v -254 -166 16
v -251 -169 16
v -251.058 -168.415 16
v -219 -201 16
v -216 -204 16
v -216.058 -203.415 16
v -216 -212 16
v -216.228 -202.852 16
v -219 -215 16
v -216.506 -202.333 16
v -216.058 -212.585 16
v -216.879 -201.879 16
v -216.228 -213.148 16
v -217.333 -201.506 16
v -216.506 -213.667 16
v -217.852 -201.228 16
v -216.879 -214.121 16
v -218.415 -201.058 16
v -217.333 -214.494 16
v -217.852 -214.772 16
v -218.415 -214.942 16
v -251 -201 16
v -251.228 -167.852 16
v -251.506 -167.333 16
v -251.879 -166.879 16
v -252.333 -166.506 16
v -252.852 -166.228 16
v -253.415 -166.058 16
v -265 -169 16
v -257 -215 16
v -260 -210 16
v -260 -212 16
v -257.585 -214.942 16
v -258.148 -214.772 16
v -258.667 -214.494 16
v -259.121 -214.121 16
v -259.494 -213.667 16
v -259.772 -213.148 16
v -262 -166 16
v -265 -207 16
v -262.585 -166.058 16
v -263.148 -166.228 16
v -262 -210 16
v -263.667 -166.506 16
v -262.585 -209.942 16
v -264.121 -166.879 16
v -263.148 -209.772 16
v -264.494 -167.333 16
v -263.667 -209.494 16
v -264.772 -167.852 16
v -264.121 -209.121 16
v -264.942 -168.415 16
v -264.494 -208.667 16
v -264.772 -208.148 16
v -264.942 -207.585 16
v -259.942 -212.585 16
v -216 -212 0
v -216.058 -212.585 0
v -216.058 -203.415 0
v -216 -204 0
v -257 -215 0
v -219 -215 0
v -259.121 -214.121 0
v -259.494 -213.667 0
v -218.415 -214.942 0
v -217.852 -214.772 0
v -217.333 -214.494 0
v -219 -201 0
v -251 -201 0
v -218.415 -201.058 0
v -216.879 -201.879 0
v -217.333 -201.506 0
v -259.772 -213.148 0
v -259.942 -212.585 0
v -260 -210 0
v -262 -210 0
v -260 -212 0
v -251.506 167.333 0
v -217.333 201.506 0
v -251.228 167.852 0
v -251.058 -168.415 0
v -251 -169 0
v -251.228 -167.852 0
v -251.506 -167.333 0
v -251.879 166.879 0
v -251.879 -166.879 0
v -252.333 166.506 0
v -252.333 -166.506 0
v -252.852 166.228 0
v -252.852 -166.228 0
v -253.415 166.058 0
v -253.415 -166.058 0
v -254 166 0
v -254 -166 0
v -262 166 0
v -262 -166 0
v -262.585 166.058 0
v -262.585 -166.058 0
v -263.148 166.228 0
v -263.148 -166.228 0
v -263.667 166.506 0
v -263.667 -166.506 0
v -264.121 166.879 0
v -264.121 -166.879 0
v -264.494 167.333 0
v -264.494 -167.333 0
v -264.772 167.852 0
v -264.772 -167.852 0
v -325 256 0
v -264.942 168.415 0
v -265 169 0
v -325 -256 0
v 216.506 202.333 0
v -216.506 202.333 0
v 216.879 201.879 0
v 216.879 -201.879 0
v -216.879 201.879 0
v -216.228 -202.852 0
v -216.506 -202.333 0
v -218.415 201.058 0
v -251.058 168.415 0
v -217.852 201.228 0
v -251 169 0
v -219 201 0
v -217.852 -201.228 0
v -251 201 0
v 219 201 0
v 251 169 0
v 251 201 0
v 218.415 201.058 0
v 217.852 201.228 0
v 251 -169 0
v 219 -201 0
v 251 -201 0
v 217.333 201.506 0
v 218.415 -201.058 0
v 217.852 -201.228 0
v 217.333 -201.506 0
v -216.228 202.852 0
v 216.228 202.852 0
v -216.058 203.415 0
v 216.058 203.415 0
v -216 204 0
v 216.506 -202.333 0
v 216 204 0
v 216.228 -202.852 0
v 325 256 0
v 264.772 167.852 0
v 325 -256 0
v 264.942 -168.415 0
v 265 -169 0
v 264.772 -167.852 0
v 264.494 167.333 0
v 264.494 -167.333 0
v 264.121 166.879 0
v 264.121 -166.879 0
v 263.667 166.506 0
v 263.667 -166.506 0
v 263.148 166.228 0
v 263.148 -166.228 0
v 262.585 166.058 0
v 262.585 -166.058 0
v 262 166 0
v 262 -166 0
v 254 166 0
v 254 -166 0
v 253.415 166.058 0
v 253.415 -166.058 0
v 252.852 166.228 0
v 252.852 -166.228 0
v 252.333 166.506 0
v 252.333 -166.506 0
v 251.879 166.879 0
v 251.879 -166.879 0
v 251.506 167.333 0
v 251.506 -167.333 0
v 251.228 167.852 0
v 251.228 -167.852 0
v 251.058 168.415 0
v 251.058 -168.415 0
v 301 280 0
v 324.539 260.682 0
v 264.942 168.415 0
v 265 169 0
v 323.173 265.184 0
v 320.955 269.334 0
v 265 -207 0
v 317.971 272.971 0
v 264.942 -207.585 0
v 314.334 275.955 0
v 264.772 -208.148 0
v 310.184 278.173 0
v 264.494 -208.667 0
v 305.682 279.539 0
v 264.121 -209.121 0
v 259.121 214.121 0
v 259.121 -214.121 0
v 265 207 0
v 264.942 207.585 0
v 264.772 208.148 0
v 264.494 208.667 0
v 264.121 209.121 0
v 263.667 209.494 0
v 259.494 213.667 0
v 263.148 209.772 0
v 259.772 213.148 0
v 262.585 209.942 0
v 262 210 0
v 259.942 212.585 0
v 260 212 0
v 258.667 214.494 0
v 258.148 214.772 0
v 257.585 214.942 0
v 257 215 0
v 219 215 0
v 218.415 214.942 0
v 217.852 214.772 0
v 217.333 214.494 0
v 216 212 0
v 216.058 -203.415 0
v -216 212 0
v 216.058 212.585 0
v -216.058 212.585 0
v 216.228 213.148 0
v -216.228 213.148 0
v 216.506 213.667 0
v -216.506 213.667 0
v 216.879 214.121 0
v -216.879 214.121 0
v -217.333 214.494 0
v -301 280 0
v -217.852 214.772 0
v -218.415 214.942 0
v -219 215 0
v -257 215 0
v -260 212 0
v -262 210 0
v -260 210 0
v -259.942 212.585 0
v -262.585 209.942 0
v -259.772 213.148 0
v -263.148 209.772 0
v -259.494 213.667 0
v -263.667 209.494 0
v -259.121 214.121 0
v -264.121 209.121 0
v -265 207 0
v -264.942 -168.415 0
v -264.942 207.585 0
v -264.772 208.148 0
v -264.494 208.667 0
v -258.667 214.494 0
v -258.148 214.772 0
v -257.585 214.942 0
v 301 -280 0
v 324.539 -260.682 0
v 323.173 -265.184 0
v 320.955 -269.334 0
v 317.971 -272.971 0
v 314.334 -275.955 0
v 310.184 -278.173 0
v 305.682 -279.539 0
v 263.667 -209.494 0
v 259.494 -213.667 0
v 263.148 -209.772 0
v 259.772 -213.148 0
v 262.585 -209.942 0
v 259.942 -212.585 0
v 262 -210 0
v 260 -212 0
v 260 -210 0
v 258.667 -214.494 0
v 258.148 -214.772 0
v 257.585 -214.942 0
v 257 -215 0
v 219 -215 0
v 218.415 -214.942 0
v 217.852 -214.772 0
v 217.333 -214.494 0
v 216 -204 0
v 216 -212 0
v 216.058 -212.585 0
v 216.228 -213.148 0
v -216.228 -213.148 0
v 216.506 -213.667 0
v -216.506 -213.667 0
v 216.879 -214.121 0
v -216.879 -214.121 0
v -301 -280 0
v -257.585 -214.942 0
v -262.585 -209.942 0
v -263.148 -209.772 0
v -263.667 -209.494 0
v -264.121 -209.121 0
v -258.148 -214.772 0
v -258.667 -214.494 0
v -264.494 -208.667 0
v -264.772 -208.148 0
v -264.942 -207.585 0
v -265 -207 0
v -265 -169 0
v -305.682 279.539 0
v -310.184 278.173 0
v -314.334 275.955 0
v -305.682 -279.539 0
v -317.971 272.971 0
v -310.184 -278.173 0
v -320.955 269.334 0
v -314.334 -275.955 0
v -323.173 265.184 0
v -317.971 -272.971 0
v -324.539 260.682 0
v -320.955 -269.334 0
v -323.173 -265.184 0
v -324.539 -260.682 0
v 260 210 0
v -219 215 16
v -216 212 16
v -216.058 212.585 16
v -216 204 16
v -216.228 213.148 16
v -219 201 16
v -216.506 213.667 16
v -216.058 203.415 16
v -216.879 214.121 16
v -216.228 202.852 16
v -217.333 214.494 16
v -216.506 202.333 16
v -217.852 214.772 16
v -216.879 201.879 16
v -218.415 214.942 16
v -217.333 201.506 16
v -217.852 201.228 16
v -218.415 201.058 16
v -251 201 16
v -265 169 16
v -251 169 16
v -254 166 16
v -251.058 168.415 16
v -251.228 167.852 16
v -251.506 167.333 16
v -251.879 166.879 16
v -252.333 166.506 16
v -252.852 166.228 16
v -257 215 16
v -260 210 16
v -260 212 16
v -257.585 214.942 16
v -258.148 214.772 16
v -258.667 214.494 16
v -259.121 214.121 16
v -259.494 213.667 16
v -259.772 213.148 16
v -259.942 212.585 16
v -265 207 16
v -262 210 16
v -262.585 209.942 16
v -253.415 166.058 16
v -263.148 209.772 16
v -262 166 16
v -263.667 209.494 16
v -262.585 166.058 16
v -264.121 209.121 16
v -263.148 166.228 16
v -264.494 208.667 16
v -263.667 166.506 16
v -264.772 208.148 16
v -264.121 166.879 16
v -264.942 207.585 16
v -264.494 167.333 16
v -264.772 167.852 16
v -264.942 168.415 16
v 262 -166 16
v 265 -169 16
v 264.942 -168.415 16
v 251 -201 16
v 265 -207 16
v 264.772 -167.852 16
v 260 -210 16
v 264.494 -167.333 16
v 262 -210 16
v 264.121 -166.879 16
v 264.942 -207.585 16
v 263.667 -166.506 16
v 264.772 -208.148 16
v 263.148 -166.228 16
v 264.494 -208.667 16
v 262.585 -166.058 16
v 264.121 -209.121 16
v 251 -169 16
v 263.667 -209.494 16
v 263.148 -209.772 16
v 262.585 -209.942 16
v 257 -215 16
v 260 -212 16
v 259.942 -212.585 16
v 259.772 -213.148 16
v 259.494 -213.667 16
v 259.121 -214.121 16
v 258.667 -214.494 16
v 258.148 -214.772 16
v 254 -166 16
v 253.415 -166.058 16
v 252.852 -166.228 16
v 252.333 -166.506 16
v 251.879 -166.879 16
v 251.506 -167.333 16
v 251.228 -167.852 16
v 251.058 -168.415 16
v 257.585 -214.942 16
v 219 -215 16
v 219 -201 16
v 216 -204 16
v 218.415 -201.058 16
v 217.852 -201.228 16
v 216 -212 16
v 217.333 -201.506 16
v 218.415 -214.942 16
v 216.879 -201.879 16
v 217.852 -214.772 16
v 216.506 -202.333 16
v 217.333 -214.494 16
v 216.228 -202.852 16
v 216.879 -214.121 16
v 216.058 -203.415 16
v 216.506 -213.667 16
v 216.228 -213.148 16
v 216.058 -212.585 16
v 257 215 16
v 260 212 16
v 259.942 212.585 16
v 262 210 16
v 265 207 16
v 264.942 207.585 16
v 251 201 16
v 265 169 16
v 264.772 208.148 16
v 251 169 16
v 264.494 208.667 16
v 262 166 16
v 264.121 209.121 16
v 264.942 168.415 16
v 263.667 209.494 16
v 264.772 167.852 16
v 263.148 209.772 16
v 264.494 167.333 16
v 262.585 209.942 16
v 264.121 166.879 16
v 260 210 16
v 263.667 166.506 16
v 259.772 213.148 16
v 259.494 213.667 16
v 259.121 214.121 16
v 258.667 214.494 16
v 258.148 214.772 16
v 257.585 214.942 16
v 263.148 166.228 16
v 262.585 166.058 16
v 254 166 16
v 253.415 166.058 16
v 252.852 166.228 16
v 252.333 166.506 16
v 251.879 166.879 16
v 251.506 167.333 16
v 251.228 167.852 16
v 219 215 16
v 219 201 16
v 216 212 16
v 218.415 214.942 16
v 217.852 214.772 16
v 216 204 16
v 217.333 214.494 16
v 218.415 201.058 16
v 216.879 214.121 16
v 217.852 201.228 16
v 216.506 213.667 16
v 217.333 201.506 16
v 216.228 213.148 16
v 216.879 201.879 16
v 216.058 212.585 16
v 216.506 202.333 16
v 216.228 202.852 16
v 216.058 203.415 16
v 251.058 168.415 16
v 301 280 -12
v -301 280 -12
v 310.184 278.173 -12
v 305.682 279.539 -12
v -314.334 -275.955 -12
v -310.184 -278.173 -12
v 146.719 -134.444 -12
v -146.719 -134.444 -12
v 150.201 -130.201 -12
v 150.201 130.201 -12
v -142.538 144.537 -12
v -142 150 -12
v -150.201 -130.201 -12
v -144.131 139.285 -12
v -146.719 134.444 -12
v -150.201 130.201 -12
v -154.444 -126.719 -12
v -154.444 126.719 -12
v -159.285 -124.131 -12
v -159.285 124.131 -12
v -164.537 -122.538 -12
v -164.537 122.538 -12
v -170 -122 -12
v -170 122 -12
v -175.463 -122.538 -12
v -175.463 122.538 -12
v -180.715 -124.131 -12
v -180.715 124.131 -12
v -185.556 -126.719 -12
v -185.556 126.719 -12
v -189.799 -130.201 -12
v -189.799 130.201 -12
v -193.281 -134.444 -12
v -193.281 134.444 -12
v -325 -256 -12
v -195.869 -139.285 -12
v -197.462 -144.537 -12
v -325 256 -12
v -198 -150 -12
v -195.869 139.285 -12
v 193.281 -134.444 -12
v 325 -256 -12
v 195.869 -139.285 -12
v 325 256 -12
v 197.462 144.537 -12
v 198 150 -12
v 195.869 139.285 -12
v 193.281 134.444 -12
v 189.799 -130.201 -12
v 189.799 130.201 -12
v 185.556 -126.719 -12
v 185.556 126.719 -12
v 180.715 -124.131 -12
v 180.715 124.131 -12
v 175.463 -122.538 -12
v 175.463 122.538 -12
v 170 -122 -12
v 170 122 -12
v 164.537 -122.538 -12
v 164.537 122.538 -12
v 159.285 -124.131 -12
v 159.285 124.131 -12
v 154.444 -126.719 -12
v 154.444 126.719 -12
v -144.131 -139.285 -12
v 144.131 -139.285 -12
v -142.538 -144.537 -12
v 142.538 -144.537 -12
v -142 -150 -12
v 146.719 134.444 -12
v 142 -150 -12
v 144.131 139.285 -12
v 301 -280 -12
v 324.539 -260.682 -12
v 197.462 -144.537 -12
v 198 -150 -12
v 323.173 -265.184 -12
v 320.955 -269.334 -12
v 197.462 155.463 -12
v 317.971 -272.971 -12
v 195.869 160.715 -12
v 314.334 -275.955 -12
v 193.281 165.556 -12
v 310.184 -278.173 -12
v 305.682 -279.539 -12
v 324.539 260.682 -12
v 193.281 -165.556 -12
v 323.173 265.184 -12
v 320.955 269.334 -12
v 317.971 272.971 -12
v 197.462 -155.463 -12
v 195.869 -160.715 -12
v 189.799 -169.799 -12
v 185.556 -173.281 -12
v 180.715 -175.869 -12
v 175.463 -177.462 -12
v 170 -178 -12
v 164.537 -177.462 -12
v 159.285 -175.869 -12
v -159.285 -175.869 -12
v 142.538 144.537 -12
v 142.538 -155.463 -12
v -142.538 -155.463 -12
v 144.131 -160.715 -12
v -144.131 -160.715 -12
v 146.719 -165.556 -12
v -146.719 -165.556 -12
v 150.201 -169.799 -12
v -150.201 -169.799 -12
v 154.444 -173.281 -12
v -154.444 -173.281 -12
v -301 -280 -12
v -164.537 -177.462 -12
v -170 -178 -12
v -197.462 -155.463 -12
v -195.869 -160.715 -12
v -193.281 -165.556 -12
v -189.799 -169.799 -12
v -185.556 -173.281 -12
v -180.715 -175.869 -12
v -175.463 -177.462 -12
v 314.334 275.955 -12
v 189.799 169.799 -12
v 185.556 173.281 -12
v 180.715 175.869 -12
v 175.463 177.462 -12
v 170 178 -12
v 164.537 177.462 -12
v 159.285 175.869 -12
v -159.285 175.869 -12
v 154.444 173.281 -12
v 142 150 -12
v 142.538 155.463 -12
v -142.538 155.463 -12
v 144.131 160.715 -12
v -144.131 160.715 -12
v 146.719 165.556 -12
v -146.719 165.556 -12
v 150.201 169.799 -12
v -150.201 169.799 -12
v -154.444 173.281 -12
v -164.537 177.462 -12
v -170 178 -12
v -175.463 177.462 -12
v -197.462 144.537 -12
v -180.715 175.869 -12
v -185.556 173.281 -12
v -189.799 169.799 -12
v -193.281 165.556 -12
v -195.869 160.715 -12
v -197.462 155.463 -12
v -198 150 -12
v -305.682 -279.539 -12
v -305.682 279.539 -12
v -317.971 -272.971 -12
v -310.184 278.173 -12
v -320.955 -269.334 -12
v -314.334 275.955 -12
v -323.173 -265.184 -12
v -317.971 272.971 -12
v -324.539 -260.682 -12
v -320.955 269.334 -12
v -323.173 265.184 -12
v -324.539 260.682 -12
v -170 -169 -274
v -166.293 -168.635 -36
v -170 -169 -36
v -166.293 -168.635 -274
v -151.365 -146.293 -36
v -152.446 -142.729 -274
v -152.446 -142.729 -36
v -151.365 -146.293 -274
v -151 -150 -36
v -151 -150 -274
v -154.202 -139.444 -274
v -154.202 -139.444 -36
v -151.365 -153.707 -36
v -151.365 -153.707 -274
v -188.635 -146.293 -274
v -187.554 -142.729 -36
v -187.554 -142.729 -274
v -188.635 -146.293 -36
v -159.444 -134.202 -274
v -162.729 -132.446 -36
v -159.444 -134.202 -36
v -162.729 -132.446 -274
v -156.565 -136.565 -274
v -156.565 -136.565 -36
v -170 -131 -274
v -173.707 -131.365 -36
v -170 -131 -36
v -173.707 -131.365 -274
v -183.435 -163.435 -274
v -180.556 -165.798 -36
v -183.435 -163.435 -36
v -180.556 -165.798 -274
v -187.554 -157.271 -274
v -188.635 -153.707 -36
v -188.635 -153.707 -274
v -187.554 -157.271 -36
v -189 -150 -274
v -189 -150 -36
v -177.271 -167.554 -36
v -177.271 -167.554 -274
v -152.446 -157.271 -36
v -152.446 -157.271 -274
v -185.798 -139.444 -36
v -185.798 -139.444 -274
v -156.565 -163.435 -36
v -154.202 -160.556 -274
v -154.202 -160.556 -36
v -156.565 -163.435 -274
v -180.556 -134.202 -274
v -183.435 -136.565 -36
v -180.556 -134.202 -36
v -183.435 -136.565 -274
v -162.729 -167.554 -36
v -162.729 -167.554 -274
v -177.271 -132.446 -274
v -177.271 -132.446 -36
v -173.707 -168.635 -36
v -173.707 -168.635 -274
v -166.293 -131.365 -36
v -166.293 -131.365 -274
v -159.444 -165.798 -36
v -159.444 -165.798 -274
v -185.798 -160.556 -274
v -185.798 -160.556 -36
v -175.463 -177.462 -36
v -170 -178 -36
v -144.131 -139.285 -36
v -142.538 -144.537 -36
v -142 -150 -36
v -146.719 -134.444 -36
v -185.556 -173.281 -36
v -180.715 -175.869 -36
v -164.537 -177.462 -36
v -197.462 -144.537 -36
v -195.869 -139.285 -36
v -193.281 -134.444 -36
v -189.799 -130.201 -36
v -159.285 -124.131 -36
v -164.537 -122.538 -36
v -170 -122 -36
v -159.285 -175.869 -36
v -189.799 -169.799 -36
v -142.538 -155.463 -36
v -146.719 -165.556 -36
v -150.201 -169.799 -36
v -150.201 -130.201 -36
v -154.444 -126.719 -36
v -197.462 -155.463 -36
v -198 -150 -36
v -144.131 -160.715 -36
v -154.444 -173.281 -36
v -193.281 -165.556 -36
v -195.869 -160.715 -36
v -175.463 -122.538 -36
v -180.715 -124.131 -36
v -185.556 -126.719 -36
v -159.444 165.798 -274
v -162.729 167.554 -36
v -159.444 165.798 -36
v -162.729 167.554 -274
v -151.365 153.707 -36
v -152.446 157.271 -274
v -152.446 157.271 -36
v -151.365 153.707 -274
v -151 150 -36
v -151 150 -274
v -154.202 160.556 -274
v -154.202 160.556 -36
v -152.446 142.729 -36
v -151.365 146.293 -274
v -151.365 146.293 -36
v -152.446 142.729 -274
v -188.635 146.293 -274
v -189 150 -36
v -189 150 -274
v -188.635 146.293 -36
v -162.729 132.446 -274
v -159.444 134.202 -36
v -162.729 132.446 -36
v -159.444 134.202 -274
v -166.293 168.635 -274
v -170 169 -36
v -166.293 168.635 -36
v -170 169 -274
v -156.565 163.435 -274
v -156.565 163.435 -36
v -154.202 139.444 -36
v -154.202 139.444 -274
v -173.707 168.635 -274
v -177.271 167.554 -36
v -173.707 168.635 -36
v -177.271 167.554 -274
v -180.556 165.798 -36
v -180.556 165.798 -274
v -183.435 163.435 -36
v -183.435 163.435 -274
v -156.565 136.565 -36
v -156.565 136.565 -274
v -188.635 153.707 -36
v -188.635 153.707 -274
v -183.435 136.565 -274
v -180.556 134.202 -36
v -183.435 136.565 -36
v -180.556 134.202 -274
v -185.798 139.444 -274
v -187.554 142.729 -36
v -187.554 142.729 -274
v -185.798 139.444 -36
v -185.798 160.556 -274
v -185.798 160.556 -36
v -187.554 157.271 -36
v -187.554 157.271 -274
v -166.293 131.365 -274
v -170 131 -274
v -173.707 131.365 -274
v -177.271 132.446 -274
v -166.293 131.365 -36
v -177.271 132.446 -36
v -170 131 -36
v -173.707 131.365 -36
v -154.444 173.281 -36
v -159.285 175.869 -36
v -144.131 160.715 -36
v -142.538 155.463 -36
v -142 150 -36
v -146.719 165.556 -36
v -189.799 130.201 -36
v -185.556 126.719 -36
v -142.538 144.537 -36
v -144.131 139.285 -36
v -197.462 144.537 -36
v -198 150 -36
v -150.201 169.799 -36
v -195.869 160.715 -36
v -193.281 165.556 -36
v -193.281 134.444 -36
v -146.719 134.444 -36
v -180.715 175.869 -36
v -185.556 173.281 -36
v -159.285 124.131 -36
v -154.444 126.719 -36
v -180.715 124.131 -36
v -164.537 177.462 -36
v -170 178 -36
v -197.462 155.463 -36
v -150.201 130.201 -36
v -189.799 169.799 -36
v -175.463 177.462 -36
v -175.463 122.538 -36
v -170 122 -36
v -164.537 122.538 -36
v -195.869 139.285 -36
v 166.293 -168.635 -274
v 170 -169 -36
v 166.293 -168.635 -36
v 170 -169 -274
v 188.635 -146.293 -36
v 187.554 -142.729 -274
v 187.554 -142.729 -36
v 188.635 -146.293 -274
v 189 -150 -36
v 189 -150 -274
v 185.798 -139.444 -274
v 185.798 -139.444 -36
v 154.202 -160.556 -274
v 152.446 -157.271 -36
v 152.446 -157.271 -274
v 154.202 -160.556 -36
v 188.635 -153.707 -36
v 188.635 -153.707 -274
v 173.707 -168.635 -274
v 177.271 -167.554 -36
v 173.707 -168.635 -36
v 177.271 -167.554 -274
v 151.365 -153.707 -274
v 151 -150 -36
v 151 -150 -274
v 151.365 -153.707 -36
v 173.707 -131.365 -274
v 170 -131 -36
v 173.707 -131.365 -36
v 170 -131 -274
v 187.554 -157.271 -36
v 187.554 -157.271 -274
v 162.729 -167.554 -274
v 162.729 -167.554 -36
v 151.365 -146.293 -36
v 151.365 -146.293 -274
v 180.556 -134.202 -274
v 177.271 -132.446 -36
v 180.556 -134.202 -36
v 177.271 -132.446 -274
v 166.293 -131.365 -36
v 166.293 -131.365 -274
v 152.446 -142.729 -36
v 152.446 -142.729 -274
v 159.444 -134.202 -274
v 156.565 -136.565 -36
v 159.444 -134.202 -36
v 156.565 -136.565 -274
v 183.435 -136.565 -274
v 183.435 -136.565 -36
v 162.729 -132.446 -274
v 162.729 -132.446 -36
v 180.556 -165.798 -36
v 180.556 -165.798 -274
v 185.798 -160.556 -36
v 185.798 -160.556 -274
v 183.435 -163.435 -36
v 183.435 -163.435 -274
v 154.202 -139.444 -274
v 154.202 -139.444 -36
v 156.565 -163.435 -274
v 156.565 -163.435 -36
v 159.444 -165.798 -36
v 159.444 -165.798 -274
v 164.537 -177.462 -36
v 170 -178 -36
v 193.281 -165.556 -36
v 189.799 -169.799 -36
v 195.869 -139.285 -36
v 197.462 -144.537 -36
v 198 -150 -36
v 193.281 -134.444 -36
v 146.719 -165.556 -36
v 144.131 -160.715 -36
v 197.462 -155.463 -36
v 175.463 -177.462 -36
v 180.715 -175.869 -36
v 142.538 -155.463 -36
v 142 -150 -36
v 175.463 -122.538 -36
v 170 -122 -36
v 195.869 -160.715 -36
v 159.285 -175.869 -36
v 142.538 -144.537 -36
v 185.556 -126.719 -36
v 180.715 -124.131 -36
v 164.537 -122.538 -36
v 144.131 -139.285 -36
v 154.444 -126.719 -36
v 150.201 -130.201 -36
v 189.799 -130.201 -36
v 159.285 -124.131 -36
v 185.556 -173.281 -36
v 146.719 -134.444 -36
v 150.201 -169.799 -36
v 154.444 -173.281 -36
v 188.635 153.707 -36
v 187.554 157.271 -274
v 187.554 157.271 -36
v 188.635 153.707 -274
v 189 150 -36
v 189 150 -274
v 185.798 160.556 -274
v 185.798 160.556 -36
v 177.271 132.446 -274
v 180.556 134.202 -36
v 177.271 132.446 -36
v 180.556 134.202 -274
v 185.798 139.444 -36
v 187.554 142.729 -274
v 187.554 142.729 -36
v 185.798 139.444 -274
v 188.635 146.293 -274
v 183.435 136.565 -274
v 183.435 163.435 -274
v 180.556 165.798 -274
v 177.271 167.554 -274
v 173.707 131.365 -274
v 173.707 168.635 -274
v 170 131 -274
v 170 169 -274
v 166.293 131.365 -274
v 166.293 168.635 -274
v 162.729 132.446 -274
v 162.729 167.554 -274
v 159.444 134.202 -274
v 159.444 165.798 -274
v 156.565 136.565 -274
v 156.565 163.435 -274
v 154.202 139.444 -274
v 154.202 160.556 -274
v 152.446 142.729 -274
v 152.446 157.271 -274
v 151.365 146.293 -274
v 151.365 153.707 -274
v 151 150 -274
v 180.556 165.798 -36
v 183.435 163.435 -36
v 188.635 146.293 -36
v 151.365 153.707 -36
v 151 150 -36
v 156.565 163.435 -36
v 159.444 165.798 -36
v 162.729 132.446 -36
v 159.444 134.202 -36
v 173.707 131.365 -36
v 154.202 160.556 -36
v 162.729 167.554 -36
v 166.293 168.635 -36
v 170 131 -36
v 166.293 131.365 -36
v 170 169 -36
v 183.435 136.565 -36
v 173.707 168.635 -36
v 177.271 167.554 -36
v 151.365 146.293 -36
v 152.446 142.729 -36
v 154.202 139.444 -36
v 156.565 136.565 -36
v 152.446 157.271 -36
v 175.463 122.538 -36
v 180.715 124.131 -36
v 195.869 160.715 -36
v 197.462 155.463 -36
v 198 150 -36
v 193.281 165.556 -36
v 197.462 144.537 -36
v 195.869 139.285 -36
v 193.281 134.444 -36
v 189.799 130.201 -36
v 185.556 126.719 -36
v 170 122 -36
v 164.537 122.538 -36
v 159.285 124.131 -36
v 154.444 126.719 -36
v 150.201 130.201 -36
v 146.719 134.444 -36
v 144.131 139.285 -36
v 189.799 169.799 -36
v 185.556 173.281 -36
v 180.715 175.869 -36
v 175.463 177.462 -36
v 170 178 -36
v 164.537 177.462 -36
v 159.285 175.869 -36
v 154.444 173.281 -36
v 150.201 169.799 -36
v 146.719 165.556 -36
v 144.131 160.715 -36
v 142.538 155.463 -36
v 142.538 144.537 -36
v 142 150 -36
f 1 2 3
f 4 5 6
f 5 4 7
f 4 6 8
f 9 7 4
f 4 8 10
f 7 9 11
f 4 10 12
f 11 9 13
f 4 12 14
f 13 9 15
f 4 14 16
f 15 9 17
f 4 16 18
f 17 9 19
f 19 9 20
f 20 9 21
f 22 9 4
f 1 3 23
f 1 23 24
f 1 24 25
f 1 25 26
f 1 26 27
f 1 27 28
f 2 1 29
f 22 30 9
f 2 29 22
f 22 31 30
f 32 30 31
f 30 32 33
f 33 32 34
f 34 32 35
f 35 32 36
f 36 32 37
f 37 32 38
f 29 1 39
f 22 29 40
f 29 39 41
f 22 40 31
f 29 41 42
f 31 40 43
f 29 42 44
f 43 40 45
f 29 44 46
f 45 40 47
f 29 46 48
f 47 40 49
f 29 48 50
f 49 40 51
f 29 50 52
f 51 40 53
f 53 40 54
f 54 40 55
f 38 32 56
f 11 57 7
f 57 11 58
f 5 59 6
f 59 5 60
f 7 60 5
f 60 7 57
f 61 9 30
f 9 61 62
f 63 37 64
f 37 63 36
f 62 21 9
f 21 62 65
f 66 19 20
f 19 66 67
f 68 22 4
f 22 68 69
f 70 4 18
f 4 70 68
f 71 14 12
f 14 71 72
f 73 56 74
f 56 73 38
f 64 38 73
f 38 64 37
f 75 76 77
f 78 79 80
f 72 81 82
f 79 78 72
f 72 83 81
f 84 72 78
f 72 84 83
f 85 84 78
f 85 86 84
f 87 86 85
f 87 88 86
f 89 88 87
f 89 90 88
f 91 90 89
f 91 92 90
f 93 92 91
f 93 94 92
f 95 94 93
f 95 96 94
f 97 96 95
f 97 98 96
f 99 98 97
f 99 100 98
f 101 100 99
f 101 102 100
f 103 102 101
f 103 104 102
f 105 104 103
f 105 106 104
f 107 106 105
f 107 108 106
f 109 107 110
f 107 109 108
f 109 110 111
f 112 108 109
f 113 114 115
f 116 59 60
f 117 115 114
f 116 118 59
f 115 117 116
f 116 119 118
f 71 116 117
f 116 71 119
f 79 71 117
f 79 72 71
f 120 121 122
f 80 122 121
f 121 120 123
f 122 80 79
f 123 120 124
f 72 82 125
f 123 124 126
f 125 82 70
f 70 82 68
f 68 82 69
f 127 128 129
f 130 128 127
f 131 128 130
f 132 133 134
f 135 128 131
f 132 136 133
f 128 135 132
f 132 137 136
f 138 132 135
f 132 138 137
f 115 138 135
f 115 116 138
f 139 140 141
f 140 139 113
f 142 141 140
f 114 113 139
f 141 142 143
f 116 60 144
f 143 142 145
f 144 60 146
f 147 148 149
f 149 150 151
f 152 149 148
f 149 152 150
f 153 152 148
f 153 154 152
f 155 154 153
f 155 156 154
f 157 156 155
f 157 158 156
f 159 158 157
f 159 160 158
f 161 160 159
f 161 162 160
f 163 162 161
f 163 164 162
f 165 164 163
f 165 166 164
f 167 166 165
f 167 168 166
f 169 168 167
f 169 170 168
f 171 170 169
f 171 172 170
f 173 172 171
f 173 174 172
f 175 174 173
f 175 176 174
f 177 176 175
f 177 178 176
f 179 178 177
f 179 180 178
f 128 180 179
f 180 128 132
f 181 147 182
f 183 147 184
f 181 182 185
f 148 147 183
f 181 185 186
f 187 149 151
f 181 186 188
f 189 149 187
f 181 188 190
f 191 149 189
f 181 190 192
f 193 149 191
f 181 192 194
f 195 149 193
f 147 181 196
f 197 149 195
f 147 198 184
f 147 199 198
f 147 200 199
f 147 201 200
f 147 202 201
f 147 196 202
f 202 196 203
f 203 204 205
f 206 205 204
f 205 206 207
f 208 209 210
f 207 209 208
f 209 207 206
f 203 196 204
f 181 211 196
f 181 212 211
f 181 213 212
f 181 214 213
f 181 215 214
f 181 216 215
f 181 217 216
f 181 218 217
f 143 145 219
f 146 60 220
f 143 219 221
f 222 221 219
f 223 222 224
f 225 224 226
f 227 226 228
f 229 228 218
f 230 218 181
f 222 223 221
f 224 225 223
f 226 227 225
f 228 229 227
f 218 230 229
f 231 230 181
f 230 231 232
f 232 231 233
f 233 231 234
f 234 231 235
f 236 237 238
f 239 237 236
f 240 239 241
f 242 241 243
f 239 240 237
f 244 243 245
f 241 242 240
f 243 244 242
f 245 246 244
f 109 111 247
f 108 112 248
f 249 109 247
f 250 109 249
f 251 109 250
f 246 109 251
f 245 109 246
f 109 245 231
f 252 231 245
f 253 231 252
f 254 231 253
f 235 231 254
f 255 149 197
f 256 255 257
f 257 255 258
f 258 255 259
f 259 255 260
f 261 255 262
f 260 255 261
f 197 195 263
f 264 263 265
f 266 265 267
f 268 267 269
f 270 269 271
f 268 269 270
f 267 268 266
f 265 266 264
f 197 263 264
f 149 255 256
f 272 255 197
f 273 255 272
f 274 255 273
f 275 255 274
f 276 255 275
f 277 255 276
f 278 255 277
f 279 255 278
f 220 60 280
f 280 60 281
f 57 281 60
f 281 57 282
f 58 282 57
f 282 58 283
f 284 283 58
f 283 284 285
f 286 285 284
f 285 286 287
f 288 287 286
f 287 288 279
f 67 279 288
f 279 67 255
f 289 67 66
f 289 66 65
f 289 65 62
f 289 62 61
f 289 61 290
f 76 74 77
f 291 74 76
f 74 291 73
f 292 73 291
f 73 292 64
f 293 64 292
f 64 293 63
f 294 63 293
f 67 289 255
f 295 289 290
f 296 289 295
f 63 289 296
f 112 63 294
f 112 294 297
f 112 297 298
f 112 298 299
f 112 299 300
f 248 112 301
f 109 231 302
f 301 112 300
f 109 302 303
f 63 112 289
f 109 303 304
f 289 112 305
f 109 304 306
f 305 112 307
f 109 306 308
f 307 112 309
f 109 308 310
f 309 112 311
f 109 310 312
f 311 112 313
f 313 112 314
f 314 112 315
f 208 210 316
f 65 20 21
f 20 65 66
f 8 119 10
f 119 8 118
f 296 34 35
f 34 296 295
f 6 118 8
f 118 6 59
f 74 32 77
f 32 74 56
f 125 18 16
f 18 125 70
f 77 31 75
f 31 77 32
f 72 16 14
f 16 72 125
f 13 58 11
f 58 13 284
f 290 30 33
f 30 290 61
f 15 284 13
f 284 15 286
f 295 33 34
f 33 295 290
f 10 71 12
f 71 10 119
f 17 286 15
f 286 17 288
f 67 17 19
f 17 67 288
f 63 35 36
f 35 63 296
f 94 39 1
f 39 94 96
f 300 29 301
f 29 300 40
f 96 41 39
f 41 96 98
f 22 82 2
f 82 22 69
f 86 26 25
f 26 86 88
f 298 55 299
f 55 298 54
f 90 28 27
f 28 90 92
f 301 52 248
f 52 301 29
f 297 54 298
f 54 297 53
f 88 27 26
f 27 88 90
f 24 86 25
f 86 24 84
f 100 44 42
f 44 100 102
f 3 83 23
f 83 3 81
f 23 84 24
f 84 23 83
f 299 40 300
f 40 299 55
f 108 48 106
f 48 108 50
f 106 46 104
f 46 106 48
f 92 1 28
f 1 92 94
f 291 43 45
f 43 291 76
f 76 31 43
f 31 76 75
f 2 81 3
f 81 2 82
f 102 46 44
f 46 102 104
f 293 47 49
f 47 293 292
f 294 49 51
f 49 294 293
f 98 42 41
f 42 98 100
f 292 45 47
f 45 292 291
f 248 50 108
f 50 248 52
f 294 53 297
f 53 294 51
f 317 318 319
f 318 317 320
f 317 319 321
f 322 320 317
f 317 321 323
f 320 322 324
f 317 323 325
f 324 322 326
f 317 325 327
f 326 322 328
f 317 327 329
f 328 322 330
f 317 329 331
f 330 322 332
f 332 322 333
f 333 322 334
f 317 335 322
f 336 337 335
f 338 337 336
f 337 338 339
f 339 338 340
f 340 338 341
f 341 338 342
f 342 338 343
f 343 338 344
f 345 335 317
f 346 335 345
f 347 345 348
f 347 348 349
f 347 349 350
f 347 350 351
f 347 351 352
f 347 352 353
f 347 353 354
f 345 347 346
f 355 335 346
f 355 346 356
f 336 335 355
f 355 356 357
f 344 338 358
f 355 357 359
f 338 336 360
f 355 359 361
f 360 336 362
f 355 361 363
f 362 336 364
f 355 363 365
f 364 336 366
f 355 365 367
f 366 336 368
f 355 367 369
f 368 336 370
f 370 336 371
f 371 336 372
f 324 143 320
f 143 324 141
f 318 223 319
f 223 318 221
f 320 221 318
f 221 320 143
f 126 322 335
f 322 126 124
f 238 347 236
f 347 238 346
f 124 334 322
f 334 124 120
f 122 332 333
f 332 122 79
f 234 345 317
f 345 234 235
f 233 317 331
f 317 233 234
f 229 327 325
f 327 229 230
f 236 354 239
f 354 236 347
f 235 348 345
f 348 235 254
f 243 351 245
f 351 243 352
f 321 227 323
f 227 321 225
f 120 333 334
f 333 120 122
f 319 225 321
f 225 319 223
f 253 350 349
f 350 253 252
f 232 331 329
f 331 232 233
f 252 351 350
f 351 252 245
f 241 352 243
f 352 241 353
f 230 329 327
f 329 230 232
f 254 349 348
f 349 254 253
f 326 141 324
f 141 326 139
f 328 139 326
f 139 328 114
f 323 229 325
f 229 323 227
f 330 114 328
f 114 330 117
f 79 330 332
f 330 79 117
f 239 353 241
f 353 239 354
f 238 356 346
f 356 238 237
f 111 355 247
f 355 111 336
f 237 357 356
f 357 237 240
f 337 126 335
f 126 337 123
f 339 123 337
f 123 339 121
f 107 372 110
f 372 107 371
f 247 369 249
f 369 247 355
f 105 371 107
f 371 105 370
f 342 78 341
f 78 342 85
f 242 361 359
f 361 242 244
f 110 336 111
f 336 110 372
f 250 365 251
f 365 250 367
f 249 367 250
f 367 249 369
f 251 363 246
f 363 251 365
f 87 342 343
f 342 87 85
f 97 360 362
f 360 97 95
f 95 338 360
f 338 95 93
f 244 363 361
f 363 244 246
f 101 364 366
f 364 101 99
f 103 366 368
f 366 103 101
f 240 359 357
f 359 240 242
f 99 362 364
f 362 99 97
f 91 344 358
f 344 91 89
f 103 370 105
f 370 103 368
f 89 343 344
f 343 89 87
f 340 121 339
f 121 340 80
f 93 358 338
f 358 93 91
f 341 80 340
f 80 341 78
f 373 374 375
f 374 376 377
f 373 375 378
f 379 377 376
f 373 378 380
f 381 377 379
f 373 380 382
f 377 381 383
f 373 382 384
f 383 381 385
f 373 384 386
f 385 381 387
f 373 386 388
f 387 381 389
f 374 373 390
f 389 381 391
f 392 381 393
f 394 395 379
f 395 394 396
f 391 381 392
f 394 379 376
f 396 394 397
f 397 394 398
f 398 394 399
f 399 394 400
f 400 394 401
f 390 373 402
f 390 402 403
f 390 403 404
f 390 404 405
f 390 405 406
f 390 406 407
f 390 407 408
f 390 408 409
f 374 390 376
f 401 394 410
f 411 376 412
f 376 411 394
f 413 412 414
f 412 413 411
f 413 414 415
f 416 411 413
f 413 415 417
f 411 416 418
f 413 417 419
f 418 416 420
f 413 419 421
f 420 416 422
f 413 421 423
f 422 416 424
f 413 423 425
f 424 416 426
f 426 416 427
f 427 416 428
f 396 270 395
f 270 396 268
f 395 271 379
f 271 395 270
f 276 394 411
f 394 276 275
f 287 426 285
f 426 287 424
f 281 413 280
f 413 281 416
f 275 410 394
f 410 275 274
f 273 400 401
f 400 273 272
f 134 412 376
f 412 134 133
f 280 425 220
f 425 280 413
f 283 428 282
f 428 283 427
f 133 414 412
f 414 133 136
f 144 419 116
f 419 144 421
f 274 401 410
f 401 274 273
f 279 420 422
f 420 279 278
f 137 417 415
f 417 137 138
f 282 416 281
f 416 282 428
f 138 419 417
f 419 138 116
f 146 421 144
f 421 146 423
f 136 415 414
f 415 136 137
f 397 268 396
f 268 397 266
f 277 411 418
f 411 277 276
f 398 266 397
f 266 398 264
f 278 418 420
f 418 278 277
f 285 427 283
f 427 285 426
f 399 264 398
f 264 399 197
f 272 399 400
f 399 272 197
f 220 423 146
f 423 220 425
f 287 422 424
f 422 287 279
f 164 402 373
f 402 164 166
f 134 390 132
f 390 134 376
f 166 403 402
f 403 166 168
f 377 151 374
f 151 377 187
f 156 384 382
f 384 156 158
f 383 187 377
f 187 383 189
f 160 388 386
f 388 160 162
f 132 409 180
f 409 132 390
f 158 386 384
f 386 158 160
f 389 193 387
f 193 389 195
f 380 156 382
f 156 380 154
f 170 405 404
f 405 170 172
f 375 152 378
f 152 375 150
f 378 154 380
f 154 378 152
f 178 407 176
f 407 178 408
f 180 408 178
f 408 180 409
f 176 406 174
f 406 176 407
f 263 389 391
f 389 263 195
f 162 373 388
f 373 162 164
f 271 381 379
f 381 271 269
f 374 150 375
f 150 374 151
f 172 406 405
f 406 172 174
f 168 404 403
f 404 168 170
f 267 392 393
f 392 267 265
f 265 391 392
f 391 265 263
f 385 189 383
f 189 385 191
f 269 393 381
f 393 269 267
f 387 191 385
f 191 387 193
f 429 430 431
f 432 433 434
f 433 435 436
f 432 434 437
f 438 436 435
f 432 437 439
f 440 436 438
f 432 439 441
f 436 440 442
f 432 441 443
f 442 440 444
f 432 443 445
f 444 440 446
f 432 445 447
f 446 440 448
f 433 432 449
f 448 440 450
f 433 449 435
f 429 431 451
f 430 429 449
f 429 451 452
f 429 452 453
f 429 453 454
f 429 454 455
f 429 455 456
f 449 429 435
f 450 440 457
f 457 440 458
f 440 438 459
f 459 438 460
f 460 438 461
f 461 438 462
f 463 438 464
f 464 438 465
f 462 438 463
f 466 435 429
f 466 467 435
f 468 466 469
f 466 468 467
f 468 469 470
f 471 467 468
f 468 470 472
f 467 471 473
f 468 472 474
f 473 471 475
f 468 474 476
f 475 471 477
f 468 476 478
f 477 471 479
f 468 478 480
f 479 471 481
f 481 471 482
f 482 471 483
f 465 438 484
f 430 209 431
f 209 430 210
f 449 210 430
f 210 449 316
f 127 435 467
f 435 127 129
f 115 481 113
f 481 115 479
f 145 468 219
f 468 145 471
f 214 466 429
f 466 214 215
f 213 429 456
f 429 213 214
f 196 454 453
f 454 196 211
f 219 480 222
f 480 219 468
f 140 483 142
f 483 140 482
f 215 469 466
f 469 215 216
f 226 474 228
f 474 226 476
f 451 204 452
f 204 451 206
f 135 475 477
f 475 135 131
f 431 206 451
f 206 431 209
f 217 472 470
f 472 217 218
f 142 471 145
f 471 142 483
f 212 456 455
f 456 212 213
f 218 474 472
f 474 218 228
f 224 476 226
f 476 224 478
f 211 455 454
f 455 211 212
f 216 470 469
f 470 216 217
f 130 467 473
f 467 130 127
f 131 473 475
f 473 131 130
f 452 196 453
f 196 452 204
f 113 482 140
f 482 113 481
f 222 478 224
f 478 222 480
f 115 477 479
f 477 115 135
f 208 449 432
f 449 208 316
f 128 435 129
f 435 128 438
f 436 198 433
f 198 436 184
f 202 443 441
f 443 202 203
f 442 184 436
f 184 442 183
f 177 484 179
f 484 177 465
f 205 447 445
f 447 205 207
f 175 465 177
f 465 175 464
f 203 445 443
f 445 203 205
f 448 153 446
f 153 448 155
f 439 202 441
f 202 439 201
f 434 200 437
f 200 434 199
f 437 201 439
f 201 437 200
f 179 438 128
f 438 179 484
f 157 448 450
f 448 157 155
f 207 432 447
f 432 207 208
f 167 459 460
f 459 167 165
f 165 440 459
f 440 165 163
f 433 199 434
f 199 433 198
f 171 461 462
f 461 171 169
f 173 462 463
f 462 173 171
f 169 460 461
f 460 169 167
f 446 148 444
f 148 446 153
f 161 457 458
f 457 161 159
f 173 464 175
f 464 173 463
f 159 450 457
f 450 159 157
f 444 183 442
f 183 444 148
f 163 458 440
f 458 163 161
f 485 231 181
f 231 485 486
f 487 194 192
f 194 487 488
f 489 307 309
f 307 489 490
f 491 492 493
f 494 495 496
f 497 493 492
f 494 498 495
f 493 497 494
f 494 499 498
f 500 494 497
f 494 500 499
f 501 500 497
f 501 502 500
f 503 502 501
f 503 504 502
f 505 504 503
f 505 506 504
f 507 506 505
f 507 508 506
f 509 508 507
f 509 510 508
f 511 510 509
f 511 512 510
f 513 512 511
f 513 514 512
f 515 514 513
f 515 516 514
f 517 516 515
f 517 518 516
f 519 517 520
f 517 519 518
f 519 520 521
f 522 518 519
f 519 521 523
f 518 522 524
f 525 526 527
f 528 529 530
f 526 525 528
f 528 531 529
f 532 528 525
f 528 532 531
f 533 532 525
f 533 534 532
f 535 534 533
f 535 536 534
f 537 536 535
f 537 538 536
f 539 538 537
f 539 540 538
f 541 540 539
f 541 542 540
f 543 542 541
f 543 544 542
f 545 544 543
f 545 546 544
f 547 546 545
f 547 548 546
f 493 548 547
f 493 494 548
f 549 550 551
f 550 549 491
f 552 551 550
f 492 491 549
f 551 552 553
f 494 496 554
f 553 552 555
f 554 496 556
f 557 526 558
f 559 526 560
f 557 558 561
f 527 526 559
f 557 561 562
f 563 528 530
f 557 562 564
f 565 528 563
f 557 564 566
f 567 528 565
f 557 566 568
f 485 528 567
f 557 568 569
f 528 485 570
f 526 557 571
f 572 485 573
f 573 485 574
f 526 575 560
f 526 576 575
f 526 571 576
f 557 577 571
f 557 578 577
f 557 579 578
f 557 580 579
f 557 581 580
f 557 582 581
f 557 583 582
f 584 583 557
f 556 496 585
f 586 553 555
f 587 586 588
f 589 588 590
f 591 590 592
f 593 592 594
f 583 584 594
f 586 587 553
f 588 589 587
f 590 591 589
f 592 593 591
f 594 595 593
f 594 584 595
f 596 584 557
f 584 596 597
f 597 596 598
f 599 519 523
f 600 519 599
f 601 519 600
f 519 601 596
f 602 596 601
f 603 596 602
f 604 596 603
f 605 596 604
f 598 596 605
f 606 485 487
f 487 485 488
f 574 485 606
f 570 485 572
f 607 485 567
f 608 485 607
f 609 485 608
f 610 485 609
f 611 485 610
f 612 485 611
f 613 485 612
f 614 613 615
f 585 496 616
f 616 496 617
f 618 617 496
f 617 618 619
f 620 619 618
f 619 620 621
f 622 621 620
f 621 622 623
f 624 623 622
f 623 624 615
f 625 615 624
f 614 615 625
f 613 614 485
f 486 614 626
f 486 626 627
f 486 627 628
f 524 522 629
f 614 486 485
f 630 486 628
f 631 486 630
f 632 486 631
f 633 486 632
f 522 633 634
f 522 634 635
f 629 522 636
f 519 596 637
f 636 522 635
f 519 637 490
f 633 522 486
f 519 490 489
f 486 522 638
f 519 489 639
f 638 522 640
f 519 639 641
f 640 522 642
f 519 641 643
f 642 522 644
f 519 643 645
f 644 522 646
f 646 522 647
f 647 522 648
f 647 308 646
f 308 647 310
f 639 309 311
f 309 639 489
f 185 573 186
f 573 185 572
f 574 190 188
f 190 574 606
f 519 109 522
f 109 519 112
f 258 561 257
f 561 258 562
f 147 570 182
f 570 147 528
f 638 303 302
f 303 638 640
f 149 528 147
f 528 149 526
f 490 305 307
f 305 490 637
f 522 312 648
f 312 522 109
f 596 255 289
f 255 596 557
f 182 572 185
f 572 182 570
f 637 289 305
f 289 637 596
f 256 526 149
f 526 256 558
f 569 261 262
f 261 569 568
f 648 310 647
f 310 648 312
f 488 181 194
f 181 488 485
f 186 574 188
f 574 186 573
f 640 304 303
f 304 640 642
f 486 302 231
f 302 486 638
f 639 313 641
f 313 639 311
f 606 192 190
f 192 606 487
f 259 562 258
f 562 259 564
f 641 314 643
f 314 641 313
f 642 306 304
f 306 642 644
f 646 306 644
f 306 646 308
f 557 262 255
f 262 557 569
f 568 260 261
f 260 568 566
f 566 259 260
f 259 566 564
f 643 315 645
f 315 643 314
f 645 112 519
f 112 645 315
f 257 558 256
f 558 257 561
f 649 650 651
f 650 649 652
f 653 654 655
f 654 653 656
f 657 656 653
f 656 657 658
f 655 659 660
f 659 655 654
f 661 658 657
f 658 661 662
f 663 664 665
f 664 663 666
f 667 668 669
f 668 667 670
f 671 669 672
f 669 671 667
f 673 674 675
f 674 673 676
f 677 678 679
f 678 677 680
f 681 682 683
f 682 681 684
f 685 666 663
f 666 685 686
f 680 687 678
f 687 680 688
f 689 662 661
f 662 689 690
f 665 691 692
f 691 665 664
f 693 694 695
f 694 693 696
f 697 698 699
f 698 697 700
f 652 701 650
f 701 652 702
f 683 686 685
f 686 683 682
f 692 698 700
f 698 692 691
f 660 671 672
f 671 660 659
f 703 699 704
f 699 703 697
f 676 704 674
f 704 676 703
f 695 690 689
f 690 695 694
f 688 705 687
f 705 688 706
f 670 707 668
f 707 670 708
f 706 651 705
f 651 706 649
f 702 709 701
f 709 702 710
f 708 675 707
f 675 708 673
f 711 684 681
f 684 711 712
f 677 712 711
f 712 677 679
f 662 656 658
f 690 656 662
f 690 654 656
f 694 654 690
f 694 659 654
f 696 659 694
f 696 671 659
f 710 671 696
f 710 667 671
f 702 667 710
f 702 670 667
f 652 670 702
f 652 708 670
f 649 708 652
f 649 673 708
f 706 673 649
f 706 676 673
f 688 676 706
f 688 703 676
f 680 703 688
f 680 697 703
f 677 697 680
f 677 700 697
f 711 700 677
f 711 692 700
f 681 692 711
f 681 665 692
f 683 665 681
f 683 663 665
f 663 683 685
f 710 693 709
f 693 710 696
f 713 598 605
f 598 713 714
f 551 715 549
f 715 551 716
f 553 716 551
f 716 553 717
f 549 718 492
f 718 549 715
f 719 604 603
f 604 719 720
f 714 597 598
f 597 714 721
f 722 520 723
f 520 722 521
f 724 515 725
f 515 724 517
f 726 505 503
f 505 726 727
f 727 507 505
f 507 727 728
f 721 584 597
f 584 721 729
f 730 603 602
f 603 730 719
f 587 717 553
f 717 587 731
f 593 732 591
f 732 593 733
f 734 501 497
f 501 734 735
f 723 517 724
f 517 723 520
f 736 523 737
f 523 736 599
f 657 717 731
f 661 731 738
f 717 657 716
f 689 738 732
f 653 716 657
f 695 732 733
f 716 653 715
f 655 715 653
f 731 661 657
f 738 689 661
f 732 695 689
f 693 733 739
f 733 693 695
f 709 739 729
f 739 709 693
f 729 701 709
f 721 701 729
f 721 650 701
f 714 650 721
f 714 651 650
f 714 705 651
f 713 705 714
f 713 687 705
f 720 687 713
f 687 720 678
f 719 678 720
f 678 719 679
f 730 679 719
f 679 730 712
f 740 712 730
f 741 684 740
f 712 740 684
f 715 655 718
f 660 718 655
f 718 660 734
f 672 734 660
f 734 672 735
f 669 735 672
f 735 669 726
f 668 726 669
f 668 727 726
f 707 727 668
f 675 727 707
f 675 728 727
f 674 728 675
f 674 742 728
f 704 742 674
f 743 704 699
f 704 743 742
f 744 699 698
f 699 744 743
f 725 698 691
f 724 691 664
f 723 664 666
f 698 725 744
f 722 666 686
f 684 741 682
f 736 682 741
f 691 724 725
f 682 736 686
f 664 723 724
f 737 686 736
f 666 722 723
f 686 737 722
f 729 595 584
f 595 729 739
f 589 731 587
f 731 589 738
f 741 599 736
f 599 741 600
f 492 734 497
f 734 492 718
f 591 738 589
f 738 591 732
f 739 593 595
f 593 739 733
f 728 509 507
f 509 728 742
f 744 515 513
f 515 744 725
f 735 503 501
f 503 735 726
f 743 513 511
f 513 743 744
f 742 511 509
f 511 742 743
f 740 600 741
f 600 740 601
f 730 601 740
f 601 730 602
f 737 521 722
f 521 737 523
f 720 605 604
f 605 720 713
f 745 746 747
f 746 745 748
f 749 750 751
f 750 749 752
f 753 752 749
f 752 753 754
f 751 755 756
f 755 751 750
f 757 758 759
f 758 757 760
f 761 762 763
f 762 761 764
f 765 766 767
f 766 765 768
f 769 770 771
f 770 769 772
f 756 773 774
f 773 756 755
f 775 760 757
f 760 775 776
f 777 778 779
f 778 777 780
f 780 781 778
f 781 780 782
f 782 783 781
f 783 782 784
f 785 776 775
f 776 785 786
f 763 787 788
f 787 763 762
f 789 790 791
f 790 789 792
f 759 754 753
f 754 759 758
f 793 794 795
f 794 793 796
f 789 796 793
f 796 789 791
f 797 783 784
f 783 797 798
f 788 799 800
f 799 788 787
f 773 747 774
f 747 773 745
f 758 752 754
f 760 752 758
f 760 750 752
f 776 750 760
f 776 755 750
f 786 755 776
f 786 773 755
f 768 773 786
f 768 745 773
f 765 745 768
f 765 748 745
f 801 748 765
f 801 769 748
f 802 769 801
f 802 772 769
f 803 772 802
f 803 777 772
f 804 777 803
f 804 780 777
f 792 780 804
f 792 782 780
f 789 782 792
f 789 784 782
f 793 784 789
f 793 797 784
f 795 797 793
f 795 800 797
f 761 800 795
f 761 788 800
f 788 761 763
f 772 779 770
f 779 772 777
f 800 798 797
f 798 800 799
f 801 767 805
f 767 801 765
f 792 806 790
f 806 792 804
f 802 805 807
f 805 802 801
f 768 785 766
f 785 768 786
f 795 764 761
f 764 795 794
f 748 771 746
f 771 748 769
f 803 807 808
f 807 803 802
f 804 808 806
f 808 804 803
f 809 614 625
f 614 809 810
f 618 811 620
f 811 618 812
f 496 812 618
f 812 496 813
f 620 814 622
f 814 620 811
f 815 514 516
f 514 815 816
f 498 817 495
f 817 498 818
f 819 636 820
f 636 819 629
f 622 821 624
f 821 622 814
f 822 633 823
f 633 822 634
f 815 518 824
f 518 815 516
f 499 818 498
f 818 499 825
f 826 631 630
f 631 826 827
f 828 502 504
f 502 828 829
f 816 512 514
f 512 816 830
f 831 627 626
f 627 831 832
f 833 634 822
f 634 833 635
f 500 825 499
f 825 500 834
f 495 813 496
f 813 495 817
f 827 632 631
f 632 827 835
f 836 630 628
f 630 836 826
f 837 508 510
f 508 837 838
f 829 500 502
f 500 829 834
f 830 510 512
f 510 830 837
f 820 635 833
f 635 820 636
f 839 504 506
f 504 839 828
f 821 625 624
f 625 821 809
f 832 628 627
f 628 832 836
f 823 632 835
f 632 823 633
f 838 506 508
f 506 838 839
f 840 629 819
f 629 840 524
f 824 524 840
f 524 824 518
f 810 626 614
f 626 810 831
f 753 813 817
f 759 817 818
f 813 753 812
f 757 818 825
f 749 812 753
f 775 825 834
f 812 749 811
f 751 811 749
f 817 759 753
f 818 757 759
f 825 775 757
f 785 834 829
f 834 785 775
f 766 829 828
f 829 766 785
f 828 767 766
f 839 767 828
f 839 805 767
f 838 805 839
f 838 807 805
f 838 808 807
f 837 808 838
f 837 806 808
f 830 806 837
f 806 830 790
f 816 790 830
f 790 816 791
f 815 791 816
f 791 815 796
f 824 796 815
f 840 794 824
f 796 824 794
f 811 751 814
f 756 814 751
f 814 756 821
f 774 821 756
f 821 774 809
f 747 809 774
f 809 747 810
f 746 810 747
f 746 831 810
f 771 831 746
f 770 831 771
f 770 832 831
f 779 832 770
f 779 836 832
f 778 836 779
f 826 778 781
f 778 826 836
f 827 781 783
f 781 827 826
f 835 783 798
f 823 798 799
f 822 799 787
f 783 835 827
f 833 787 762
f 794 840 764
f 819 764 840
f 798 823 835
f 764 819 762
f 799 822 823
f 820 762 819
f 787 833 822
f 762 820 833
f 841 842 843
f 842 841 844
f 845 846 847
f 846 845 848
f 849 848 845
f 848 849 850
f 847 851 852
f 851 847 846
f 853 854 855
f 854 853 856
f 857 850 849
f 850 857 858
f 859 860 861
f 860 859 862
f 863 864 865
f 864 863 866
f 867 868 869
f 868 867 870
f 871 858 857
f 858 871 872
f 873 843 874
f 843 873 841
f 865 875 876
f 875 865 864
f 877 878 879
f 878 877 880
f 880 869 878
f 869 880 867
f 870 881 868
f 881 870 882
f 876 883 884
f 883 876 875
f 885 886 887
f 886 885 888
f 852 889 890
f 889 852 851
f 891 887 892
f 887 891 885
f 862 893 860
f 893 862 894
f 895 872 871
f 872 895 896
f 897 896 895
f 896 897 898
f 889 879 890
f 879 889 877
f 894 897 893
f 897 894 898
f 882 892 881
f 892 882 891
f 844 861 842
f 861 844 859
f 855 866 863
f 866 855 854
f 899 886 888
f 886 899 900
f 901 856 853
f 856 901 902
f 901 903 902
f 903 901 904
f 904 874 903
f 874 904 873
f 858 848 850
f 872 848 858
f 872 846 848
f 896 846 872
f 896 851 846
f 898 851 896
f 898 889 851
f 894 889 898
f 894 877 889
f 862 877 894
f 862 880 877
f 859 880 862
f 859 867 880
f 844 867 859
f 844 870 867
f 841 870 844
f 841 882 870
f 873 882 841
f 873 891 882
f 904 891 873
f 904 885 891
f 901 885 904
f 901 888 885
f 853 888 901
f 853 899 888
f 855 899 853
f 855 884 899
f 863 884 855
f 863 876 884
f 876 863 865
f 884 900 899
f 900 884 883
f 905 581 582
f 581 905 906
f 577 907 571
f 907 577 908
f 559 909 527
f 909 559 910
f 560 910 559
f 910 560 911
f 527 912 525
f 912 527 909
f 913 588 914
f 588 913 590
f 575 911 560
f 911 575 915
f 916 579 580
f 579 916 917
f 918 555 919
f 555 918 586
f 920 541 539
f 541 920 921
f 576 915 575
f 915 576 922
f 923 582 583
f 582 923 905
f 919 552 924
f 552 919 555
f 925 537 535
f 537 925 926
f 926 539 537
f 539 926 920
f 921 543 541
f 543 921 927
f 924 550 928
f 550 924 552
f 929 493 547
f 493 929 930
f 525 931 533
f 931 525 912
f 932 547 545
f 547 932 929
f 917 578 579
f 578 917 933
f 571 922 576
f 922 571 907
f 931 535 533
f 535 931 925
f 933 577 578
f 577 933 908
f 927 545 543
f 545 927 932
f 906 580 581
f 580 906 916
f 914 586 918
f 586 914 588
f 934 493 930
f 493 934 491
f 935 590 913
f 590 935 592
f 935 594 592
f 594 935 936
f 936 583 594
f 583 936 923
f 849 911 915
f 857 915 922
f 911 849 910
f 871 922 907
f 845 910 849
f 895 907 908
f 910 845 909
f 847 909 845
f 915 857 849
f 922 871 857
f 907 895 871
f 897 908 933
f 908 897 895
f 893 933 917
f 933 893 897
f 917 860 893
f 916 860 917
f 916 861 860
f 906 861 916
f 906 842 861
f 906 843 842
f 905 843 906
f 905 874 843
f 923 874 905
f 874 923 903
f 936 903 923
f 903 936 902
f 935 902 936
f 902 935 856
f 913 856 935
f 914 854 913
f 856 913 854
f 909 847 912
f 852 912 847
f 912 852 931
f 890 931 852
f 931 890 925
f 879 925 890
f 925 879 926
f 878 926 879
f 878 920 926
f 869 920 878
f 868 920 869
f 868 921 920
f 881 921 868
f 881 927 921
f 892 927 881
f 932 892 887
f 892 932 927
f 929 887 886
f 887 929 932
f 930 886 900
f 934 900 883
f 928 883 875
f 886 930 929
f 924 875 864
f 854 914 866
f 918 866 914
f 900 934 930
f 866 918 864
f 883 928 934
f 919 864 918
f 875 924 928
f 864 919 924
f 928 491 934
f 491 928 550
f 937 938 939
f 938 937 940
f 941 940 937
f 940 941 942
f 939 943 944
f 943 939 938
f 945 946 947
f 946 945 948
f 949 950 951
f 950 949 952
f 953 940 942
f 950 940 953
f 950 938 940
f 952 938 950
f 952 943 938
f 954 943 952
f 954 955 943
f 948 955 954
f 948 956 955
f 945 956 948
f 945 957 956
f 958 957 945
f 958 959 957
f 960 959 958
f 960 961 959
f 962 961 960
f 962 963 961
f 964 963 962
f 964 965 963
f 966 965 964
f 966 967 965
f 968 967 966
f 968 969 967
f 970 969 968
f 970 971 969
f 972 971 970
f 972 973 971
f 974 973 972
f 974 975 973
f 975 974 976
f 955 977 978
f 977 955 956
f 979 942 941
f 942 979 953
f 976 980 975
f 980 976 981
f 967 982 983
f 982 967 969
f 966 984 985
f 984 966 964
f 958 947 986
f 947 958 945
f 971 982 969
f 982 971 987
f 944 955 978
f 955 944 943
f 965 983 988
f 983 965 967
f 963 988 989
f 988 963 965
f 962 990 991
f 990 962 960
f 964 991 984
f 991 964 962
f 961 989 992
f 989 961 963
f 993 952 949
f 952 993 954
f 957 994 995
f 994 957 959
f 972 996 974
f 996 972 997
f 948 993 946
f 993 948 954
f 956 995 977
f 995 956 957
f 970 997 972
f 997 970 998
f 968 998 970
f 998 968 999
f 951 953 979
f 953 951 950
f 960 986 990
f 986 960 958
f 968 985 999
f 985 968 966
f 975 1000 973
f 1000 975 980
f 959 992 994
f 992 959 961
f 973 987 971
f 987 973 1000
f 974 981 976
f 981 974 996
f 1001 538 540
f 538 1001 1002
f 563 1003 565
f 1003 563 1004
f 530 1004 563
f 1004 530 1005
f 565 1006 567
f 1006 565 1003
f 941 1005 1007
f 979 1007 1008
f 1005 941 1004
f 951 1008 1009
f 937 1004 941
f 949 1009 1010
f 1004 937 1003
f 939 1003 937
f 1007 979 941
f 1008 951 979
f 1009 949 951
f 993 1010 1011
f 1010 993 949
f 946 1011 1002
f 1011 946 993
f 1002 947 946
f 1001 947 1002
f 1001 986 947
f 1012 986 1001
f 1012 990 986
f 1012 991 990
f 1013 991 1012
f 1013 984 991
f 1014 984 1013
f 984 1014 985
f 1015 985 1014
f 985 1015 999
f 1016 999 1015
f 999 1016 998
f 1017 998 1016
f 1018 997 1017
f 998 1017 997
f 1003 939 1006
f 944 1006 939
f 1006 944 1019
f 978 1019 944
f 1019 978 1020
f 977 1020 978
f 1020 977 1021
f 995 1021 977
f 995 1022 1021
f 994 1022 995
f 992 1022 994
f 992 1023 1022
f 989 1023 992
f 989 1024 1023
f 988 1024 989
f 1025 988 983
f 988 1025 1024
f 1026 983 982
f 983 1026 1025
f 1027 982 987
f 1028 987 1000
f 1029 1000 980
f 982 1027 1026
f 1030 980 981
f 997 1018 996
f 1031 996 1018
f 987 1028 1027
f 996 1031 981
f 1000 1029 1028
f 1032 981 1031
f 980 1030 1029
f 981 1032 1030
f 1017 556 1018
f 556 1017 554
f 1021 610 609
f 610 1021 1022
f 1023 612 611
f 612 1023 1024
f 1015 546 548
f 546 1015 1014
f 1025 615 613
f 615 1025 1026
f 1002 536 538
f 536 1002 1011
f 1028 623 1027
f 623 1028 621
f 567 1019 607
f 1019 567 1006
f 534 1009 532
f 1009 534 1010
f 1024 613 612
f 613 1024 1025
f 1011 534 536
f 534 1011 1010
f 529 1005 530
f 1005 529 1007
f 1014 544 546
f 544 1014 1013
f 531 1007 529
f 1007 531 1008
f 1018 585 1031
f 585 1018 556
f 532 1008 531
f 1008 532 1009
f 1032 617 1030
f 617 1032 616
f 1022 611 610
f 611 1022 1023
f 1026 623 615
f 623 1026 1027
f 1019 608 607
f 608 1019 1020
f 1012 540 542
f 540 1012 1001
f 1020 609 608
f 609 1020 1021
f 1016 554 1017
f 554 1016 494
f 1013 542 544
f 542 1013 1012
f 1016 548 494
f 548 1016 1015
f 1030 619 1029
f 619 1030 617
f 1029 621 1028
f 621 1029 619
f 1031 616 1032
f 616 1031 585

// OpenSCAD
use <main.scad>
lift_center_x        = -15;
lift_lowered_deck_z  = 330;
lift_deck_thickness  = 12;
lift_rail_x          = 170;
lift_rail_y          = 150;
lift_sleeve_diameter = 38;
payload_deck_length  = 650;
payload_deck_width   = 560;
payload_box_length   = 500;
payload_box_width    = 400;
show_component_labels = false;
translate([-lift_center_x, 0, -lift_lowered_deck_z])
    lift_platform_base(0);
